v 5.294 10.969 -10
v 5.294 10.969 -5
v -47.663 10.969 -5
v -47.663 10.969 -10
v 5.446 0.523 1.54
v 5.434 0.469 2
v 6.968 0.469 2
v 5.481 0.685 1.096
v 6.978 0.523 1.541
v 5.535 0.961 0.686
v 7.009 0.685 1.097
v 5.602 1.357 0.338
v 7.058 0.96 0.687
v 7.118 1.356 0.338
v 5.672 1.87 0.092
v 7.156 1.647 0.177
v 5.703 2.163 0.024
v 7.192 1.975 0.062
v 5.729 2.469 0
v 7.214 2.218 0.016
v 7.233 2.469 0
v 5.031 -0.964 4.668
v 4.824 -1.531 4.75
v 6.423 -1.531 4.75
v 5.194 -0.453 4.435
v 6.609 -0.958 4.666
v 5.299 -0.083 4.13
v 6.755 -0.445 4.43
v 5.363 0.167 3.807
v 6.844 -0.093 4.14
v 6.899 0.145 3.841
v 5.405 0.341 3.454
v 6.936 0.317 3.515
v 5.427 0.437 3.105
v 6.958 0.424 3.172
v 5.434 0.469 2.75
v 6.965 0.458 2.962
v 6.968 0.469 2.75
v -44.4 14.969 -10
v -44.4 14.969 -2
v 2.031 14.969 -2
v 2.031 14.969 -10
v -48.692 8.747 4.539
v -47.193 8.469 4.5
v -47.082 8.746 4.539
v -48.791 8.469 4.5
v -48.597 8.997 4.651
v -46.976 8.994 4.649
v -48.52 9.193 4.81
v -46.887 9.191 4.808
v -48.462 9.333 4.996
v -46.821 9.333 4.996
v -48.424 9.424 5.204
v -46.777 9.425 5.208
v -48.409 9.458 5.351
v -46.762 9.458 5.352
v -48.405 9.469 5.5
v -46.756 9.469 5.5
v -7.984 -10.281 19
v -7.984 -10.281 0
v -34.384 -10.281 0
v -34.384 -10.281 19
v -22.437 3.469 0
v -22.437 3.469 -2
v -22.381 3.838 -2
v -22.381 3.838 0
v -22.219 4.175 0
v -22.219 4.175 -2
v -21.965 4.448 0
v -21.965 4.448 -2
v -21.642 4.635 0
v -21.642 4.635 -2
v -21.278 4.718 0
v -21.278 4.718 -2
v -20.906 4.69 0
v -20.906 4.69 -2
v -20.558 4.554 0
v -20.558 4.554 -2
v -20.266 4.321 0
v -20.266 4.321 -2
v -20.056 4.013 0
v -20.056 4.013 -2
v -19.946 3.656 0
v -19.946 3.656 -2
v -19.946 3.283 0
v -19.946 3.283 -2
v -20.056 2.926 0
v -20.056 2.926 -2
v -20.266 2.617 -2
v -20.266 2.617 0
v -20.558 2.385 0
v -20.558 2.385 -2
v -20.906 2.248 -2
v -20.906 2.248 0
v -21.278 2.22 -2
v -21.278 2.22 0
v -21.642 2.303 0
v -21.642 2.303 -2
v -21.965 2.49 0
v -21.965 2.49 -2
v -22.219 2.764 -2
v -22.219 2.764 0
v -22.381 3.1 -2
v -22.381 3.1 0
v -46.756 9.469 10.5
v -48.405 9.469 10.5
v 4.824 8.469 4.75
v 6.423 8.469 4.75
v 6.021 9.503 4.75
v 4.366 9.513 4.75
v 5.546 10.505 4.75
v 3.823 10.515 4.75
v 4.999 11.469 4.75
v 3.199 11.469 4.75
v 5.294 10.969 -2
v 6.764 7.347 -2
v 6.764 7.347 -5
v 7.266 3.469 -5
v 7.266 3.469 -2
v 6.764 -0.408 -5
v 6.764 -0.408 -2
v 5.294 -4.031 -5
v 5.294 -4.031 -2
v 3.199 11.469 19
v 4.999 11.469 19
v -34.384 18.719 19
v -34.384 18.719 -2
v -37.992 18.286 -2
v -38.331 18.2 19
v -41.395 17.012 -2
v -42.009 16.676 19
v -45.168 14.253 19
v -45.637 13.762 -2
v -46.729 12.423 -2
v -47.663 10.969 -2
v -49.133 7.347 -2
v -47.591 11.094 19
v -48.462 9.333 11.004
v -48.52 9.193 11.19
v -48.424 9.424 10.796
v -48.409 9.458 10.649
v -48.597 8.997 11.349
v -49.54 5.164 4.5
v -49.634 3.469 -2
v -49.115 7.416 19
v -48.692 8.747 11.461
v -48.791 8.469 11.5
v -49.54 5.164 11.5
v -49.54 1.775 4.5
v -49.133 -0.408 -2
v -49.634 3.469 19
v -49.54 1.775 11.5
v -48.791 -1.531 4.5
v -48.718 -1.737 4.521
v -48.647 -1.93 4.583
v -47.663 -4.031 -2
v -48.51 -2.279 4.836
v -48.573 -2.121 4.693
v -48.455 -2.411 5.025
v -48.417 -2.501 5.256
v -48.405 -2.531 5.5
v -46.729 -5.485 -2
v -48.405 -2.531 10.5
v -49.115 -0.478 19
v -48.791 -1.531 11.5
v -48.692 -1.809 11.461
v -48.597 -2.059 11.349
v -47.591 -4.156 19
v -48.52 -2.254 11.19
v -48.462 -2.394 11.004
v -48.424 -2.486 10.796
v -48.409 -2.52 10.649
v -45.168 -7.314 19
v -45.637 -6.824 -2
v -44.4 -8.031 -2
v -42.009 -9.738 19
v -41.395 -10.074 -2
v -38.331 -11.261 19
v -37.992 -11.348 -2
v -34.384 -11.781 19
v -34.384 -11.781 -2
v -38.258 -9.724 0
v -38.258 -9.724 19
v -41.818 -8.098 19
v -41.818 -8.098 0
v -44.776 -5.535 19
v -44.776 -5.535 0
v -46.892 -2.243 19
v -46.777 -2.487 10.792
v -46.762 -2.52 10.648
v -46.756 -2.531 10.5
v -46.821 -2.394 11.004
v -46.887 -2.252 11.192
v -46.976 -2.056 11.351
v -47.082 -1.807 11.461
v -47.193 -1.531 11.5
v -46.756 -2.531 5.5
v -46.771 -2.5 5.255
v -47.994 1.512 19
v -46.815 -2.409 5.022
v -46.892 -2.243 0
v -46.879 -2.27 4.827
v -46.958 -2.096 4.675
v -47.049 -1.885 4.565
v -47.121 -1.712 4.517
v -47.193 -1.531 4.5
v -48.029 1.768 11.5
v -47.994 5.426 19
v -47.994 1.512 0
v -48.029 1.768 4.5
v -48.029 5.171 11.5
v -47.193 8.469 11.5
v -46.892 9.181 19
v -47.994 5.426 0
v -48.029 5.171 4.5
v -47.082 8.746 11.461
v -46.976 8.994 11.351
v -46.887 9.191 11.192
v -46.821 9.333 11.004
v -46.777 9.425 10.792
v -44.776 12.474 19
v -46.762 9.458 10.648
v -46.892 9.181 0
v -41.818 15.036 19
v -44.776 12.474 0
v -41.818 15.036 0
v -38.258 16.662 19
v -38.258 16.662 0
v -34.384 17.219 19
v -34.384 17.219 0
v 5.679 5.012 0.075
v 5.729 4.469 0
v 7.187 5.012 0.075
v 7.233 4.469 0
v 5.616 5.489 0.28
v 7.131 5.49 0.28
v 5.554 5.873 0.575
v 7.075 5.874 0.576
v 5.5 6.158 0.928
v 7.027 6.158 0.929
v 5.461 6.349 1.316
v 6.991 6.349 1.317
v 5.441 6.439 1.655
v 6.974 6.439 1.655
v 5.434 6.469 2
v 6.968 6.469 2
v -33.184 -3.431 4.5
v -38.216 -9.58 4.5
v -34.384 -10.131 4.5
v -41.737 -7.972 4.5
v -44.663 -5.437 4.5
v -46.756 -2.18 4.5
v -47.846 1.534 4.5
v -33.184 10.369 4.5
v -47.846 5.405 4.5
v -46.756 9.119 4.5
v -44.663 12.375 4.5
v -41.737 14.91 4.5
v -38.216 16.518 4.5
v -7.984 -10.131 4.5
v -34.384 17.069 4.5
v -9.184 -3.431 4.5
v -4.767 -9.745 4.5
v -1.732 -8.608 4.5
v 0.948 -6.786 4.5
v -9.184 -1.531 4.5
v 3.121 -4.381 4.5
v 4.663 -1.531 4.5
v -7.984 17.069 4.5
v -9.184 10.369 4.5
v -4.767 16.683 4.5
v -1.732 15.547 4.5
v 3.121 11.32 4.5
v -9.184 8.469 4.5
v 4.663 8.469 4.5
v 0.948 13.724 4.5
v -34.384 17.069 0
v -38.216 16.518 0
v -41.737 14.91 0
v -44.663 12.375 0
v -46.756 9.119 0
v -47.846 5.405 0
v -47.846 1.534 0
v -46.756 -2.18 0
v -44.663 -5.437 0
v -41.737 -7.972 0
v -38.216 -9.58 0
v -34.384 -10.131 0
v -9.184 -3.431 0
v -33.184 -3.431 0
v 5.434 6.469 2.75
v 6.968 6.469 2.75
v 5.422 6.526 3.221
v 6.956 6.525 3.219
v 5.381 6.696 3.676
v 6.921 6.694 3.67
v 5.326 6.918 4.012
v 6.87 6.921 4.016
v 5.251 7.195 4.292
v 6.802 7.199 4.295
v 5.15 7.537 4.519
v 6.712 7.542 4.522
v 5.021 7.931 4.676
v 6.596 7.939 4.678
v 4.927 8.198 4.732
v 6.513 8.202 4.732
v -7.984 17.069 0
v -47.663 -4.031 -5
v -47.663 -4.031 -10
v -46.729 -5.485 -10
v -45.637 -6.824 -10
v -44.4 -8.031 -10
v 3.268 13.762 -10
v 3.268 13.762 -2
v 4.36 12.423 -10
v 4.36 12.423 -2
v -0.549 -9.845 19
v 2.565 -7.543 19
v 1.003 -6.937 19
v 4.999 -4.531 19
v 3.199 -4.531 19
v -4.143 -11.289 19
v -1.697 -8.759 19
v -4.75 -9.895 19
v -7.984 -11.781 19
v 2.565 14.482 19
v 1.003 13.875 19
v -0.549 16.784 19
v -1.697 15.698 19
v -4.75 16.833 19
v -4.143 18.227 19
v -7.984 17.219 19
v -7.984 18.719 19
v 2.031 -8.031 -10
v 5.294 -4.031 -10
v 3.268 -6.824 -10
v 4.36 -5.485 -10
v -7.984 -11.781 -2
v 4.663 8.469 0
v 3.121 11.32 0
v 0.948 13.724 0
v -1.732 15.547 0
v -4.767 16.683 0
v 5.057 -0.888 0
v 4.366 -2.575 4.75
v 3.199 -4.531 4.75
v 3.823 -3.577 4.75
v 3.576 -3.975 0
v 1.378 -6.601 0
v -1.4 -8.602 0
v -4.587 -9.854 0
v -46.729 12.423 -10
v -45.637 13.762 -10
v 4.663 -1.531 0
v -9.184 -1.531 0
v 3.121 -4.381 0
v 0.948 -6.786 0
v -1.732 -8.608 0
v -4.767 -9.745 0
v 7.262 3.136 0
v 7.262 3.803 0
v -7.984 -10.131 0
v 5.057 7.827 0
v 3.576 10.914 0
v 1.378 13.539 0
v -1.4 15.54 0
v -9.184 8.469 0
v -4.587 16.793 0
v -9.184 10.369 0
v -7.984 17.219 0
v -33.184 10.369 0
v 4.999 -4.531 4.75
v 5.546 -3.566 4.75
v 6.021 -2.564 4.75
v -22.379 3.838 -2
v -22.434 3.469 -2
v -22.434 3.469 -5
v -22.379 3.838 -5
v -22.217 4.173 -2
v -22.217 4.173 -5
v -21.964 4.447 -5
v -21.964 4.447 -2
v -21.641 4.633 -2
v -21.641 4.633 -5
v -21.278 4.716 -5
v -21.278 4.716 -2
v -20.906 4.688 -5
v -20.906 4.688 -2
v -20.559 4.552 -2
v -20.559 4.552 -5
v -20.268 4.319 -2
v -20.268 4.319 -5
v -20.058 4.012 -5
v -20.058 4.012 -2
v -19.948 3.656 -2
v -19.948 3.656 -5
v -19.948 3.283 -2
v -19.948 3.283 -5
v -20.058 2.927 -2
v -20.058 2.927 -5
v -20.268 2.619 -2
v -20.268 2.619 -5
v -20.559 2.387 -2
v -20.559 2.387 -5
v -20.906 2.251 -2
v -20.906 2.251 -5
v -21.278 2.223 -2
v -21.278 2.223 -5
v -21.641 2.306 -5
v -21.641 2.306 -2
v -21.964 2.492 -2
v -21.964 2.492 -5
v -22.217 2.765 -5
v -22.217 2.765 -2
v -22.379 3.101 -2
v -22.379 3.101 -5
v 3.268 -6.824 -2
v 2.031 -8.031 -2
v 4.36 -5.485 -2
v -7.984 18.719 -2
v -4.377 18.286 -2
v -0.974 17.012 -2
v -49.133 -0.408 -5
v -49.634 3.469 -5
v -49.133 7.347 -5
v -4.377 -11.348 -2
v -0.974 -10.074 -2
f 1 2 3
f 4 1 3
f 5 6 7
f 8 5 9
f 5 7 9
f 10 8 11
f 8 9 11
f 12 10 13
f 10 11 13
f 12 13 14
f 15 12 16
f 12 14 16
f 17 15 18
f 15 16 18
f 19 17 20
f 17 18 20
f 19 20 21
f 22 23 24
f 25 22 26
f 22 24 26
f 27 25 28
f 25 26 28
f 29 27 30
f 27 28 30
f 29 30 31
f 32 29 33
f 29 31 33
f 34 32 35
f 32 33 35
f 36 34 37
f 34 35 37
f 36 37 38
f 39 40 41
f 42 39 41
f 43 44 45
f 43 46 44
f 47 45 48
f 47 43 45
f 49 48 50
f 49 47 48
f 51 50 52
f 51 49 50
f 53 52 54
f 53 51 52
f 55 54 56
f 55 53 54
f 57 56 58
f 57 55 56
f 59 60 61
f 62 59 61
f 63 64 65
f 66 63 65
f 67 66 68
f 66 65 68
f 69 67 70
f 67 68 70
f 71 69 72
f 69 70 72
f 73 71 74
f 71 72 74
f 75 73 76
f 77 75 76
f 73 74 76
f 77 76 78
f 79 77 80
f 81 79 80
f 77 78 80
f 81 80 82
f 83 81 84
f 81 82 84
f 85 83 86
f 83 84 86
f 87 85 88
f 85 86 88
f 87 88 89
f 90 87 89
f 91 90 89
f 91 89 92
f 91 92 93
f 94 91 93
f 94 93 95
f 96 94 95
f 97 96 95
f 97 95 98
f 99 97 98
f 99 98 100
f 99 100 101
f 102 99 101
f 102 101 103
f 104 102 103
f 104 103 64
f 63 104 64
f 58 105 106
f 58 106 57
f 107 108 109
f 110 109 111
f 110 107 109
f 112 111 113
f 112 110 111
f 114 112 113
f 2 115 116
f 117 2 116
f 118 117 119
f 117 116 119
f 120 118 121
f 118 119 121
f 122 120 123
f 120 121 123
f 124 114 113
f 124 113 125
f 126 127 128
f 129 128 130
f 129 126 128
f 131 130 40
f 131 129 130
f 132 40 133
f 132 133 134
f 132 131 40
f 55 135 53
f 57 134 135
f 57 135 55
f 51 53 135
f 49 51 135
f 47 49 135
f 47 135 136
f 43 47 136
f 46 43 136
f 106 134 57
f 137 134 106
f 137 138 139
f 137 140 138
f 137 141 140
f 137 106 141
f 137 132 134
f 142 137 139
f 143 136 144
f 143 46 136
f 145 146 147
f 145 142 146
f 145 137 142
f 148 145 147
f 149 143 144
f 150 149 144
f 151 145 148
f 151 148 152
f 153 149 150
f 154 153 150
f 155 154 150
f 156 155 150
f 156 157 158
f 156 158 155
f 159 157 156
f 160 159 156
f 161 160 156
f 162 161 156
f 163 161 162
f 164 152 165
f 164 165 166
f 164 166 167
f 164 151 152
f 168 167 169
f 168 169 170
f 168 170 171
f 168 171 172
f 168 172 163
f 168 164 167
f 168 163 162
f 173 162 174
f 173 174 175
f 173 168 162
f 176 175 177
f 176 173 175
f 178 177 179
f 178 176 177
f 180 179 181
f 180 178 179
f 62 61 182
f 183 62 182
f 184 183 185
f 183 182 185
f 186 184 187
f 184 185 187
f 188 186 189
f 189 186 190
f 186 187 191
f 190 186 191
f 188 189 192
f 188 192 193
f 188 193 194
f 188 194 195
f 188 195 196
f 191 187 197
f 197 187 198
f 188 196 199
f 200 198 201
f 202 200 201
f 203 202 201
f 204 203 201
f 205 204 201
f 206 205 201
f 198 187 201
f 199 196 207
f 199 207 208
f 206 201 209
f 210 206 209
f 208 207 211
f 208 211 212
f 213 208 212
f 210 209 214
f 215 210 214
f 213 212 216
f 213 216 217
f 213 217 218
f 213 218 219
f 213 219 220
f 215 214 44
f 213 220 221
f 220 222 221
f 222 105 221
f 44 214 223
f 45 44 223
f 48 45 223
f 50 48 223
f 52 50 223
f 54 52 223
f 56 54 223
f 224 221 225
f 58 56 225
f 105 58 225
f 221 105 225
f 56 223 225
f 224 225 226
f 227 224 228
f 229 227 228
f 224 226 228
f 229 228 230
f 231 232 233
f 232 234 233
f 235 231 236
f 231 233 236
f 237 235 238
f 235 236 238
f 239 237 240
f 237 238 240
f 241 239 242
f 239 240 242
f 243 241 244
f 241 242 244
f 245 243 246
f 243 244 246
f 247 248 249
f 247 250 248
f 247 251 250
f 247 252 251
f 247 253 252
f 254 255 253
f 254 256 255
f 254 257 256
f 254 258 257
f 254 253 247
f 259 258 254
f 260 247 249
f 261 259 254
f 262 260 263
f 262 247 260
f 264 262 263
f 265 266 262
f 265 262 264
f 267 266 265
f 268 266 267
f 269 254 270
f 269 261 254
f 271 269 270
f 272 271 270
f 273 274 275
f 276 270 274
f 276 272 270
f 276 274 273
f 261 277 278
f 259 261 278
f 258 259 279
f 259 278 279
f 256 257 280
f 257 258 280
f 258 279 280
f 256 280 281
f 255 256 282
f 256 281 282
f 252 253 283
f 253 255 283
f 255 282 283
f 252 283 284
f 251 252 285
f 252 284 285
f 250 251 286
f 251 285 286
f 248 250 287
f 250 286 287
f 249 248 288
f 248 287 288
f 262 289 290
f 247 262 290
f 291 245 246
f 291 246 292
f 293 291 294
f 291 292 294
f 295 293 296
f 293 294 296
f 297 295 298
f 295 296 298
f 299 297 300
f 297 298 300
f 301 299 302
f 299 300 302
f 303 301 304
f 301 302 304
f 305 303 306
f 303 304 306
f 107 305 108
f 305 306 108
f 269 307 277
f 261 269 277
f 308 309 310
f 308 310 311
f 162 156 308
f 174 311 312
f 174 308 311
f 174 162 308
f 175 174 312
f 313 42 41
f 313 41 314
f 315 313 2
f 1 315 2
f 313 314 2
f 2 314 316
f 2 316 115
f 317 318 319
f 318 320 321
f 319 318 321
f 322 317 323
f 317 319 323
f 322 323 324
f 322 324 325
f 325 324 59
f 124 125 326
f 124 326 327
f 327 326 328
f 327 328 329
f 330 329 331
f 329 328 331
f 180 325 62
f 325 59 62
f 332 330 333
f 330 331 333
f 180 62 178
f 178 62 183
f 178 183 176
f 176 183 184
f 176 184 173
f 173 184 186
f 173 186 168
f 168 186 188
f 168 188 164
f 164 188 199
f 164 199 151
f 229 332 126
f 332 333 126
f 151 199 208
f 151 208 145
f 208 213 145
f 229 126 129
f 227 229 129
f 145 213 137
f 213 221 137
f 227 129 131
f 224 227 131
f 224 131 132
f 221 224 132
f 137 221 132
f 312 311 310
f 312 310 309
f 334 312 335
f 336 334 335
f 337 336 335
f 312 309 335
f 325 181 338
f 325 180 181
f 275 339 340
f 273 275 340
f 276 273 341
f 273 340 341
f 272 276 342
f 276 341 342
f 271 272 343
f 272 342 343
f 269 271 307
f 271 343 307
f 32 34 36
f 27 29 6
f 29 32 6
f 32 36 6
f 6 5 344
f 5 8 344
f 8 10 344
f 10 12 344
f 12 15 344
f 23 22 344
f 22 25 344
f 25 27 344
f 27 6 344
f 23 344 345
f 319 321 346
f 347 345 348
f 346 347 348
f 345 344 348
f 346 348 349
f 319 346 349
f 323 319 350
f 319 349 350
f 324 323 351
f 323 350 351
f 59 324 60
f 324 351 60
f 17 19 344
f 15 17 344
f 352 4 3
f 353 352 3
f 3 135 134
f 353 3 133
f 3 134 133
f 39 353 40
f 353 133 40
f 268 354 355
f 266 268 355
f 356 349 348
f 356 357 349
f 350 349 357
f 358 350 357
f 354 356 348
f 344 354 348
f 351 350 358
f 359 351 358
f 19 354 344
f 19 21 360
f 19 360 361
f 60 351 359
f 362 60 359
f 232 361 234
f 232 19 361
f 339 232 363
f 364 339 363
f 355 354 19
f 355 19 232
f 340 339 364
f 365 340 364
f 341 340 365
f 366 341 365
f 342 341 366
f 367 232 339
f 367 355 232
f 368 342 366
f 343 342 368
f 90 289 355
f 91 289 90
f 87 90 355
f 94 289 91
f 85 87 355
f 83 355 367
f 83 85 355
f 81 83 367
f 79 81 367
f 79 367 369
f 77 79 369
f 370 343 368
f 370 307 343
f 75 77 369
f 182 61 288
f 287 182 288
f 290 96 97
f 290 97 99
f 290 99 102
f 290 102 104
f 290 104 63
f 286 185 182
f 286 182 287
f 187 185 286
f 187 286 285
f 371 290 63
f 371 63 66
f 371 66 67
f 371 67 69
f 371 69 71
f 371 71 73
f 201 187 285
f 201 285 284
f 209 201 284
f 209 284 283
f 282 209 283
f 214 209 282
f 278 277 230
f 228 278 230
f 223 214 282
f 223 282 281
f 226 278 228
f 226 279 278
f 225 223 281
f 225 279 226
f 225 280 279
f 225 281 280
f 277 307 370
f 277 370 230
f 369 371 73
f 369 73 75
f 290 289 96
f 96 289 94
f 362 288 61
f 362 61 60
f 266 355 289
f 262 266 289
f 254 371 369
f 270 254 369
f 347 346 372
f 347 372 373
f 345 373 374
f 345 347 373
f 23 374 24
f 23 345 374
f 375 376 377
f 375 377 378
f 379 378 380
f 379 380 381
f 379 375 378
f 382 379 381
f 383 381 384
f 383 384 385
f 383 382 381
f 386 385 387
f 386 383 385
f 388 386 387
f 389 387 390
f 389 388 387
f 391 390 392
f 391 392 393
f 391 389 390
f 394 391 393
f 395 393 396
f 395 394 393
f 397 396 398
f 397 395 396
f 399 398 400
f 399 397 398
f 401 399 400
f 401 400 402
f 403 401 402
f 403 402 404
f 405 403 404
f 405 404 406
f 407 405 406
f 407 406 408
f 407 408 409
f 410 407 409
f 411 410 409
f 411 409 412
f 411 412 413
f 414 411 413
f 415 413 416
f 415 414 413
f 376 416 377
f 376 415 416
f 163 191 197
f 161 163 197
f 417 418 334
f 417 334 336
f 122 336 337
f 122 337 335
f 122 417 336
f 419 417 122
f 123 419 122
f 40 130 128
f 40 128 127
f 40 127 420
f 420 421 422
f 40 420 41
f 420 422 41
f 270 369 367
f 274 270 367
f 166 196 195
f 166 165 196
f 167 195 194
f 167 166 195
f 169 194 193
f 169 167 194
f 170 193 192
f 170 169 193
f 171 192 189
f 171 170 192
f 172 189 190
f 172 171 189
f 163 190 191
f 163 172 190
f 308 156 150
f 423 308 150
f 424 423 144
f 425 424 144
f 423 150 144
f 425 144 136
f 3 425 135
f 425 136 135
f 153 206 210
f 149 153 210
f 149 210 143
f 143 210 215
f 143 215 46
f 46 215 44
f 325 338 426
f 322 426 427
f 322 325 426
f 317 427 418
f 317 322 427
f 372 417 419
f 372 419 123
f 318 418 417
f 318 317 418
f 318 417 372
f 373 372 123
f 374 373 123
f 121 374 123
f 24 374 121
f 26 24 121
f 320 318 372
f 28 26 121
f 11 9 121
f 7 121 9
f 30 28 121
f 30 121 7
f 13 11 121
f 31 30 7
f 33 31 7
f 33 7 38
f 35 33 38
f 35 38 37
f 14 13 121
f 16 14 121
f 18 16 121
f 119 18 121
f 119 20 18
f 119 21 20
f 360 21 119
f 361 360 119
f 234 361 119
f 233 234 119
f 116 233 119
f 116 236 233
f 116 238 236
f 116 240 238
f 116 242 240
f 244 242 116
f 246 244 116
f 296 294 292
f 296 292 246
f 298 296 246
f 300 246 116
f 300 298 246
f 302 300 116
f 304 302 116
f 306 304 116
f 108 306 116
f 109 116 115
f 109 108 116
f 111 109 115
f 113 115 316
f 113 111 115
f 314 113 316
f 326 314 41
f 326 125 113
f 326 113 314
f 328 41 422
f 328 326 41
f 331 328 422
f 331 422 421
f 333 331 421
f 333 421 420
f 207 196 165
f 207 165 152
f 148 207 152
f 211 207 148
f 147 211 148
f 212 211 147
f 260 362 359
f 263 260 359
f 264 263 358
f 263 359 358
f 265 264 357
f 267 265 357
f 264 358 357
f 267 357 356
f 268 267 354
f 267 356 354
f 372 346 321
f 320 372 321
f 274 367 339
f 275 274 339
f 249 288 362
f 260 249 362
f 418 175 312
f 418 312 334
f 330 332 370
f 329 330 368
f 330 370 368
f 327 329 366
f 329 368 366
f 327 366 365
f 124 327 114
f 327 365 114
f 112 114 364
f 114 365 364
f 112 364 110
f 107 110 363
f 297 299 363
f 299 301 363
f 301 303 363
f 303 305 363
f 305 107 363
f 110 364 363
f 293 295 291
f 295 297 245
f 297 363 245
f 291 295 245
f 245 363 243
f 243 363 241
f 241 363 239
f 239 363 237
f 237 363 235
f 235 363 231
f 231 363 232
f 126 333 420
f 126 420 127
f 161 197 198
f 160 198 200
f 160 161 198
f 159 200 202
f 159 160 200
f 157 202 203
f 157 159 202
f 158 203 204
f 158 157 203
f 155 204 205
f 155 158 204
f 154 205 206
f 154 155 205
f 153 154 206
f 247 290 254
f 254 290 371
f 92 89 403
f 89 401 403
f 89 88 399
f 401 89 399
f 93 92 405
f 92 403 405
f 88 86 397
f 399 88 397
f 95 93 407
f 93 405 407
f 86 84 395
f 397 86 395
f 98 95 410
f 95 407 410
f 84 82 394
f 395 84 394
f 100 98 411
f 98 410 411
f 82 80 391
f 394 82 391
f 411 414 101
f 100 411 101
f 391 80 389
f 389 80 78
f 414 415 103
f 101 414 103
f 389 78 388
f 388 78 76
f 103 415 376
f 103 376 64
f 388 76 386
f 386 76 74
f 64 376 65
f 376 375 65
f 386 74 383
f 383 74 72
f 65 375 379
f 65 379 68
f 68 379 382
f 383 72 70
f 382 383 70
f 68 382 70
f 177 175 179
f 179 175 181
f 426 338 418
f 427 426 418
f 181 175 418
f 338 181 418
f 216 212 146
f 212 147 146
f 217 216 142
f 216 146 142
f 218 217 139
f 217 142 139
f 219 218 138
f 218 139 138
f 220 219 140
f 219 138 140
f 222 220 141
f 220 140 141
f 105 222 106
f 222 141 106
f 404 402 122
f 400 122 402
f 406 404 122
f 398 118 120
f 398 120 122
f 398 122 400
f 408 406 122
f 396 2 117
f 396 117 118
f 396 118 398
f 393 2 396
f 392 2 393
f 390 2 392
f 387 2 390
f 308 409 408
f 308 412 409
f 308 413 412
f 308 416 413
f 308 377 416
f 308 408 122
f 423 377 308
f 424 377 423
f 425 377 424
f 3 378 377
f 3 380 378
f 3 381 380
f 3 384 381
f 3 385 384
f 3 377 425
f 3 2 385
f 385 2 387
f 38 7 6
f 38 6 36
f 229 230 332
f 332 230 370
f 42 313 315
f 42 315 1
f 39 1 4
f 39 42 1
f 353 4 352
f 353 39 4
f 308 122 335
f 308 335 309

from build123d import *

# Parameters (mm, degrees)
BOSS_EXTRUDE1_DEPTH = 19
BOSS_EXTRUDE2_DEPTH = 2
BOSS_EXTRUDE3_DEPTH = 4.5
SKETCH4_W           = 4.75
SKETCH4_H           = 6
SKETCH4_W_2         = 14.25
SKETCH4_H_2         = 16
CUT_EXTRUDE1_DEPTH  = 49.452157546
SKETCH5_W           = 7
SKETCH5_H           = 12
CUT_EXTRUDE2_DEPTH  = 49.452157546
FILLET1_R           = 1
SKETCH6_R           = 1.25
BOSS_EXTRUDE4_DEPTH = 3
BOSS_EXTRUDE7_DEPTH = 8
FILLET2_R           = 2
SKETCH9_R           = 1.252428217
CUT_EXTRUDE3_DEPTH  = 10


with BuildPart() as part:
    # Sketch1 → Boss-Extrude1 (new body)
    with BuildSketch(Plane.XY):
        with BuildLine():
            Line((-34.384444189, 18.719216619), (-7.984444189, 18.719216619))
            ThreePointArc((-7.984444189, 18.719216619), (7.265555811, 3.469216619), (-7.984444189, -11.780783381))
            Line((-7.984444189, -11.780783381), (-34.384444189, -11.780783381))
            ThreePointArc((-34.384444189, -11.780783381), (-49.634444189, 3.469216619), (-34.384444189, 18.719216619))
        make_face()
        with BuildLine():
            Line((-34.384444189, 17.219216619), (-7.984444189, 17.219216619))
            ThreePointArc((-7.984444189, 17.219216619), (5.765555811, 3.469216619), (-7.984444189, -10.280783381))
            Line((-7.984444189, -10.280783381), (-34.384444189, -10.280783381))
            ThreePointArc((-34.384444189, -10.280783381), (-48.134444189, 3.469216619), (-34.384444189, 17.219216619))
        make_face(mode=Mode.SUBTRACT)
    extrude(amount=BOSS_EXTRUDE1_DEPTH)



with BuildPart() as body_2:
    # Sketch2 → Boss-Extrude2 (new body)
    with BuildSketch(Plane(origin=(0, 0, 0), x_dir=(-1, 0, 0), z_dir=(0, 0, -1))):
        with BuildLine():
            Line((34.384444189, -11.780783381), (7.984444189, -11.780783381))
            ThreePointArc((7.984444189, -11.780783381), (-7.265555811, 3.469216619), (7.984444189, 18.719216619))
            Line((7.984444189, 18.719216619), (34.384444189, 18.719216619))
            ThreePointArc((34.384444189, 18.719216619), (49.634444189, 3.469216619), (34.384444189, -11.780783381))
        make_face()
    extrude(amount=BOSS_EXTRUDE2_DEPTH)


with BuildPart() as part_1:
    add(part.part)

    add(body_2.part)  # Boss-Extrude3 merges body 2
    # Sketch3 → Boss-Extrude3 (add)
    with BuildSketch(Plane.XY):
        with BuildLine():
            Line((-22.664695889, -3.430783381), (-33.184444189, -3.430783381))
            Line((-33.184444189, -3.430783381), (-33.184444189, 10.369216619))
            Line((-33.184444189, 10.369216619), (-19.704192488, 10.369216619))
            Line((-19.704192488, 10.369216619), (-9.184444189, 10.369216619))
            Line((-9.184444189, 10.369216619), (-9.184444189, 8.469216619))
            Line((-9.184444189, 8.469216619), (4.663184056, 8.469216619))
            ThreePointArc((4.663184056, 8.469216619), (-0.337155761, 14.715615149), (-7.984444189, 17.069308538))
            Line((-7.984444189, 17.069308538), (-34.384444189, 17.069308538))
            ThreePointArc((-34.384444189, 17.069308538), (-47.984536108, 3.469216619), (-34.384444189, -10.1308753))
            Line((-34.384444189, -10.1308753), (-7.984444189, -10.1308753))
            ThreePointArc((-7.984444189, -10.1308753), (-0.337155761, -7.777181911), (4.663184056, -1.530783381))
            Line((4.663184056, -1.530783381), (-9.184444189, -1.530783381))
            Line((-9.184444189, -1.530783381), (-9.184444189, -3.430783381))
            Line((-9.184444189, -3.430783381), (-19.704192488, -3.430783381))
            Line((-19.704192488, -3.430783381), (-22.664695889, -3.430783381))
        make_face()
    extrude(amount=BOSS_EXTRUDE3_DEPTH)

    # Sketch4 → Cut-Extrude1 (cut, through all)
    with BuildSketch(Plane.ZY.offset(9.184444189)):
        with Locations((2.375, 3.469216619)):
            Rectangle(SKETCH4_W, SKETCH4_H)
        with Locations((11.875, 3.469216619)):
            Rectangle(SKETCH4_W_2, SKETCH4_H_2)
    extrude(amount=-CUT_EXTRUDE1_DEPTH, mode=Mode.SUBTRACT)

    # Sketch5 → Cut-Extrude2 (cut, through all)
    with BuildSketch(Plane(origin=(-33.184444189, 0, 0), x_dir=(0, 0, -1), z_dir=(1, 0, 0))):
        with Locations((-8, 3.469216619)):
            Rectangle(SKETCH5_W, SKETCH5_H)
    extrude(amount=-CUT_EXTRUDE2_DEPTH, mode=Mode.SUBTRACT)

    # Fillet1
    fillet1_edges = [part_1.edges().sort_by_distance(p)[0] for p in [
        (-47.580403151, -2.530783381, 11.5),
        (-47.580403151, 9.469216619, 11.5),
        (-47.580403151, 9.469216619, 4.5),
        (-47.580403151, -2.530783381, 4.5),
    ]]
    fillet(fillet1_edges, radius=FILLET1_R)

    # Sketch6 → Boss-Extrude4 (add)
    with BuildSketch(Plane(origin=(0, 0, -2), x_dir=(-1, 0, 0), z_dir=(0, 0, -1))):
        with BuildLine():
            ThreePointArc((47.662715914, -4.030783381), (49.634444189, 3.469216619), (47.662715914, 10.969216619))
            Line((47.662715914, 10.969216619), (-5.293827536, 10.969216619))
            ThreePointArc((-5.293827536, 10.969216619), (-7.265555811, 3.469216619), (-5.293827536, -4.030783381))
            Line((-5.293827536, -4.030783381), (47.662715914, -4.030783381))
        make_face()
        with Locations((21.184444189, 3.469216619)):
            Circle(SKETCH6_R, mode=Mode.SUBTRACT)
    extrude(amount=BOSS_EXTRUDE4_DEPTH)

    # Sketch10 → Boss-Extrude7 (add)
    with BuildSketch(Plane(origin=(0, 0, -2), x_dir=(-1, 0, 0), z_dir=(0, 0, -1))):
        with BuildLine():
            Line((-5.293827536, -4.030783381), (47.662715914, -4.030783381))
            ThreePointArc((47.662715914, -4.030783381), (46.201857789, -6.169830834), (44.400057001, -8.030783381))
            Line((44.400057001, -8.030783381), (-2.031168623, -8.030783381))
            ThreePointArc((-2.031168623, -8.030783381), (-3.832969412, -6.169830834), (-5.293827536, -4.030783381))
        make_face()
        with BuildLine():
            Line((-5.293827536, 10.969216619), (47.662715914, 10.969216619))
            ThreePointArc((47.662715914, 10.969216619), (46.201857789, 13.108264072), (44.400057001, 14.969216619))
            Line((44.400057001, 14.969216619), (-2.031168623, 14.969216619))
            ThreePointArc((-2.031168623, 14.969216619), (-3.832969412, 13.108264072), (-5.293827536, 10.969216619))
        make_face()
    extrude(amount=BOSS_EXTRUDE7_DEPTH)

    # Fillet2
    fillet2_edges = [part_1.edges().sort_by_distance(p)[0] for p in [
        (6.200927538, 0.469216619, 0),
        (6.200927538, 6.469216619, 0),
        (6.200927538, 6.469216619, 4.75),
        (6.200927538, 0.469216619, 4.75),
    ]]
    fillet(fillet2_edges, radius=FILLET2_R)

    # Sketch9 → Cut-Extrude3 (cut)
    with BuildSketch(Plane(origin=(0, 0, -2), x_dir=(-1, 0, 0), z_dir=(0, 0, -1))):
        with Locations((21.184444189, 3.469216619)):
            Circle(SKETCH9_R)
    extrude(amount=-CUT_EXTRUDE3_DEPTH, mode=Mode.SUBTRACT)


solid = part_1.part
